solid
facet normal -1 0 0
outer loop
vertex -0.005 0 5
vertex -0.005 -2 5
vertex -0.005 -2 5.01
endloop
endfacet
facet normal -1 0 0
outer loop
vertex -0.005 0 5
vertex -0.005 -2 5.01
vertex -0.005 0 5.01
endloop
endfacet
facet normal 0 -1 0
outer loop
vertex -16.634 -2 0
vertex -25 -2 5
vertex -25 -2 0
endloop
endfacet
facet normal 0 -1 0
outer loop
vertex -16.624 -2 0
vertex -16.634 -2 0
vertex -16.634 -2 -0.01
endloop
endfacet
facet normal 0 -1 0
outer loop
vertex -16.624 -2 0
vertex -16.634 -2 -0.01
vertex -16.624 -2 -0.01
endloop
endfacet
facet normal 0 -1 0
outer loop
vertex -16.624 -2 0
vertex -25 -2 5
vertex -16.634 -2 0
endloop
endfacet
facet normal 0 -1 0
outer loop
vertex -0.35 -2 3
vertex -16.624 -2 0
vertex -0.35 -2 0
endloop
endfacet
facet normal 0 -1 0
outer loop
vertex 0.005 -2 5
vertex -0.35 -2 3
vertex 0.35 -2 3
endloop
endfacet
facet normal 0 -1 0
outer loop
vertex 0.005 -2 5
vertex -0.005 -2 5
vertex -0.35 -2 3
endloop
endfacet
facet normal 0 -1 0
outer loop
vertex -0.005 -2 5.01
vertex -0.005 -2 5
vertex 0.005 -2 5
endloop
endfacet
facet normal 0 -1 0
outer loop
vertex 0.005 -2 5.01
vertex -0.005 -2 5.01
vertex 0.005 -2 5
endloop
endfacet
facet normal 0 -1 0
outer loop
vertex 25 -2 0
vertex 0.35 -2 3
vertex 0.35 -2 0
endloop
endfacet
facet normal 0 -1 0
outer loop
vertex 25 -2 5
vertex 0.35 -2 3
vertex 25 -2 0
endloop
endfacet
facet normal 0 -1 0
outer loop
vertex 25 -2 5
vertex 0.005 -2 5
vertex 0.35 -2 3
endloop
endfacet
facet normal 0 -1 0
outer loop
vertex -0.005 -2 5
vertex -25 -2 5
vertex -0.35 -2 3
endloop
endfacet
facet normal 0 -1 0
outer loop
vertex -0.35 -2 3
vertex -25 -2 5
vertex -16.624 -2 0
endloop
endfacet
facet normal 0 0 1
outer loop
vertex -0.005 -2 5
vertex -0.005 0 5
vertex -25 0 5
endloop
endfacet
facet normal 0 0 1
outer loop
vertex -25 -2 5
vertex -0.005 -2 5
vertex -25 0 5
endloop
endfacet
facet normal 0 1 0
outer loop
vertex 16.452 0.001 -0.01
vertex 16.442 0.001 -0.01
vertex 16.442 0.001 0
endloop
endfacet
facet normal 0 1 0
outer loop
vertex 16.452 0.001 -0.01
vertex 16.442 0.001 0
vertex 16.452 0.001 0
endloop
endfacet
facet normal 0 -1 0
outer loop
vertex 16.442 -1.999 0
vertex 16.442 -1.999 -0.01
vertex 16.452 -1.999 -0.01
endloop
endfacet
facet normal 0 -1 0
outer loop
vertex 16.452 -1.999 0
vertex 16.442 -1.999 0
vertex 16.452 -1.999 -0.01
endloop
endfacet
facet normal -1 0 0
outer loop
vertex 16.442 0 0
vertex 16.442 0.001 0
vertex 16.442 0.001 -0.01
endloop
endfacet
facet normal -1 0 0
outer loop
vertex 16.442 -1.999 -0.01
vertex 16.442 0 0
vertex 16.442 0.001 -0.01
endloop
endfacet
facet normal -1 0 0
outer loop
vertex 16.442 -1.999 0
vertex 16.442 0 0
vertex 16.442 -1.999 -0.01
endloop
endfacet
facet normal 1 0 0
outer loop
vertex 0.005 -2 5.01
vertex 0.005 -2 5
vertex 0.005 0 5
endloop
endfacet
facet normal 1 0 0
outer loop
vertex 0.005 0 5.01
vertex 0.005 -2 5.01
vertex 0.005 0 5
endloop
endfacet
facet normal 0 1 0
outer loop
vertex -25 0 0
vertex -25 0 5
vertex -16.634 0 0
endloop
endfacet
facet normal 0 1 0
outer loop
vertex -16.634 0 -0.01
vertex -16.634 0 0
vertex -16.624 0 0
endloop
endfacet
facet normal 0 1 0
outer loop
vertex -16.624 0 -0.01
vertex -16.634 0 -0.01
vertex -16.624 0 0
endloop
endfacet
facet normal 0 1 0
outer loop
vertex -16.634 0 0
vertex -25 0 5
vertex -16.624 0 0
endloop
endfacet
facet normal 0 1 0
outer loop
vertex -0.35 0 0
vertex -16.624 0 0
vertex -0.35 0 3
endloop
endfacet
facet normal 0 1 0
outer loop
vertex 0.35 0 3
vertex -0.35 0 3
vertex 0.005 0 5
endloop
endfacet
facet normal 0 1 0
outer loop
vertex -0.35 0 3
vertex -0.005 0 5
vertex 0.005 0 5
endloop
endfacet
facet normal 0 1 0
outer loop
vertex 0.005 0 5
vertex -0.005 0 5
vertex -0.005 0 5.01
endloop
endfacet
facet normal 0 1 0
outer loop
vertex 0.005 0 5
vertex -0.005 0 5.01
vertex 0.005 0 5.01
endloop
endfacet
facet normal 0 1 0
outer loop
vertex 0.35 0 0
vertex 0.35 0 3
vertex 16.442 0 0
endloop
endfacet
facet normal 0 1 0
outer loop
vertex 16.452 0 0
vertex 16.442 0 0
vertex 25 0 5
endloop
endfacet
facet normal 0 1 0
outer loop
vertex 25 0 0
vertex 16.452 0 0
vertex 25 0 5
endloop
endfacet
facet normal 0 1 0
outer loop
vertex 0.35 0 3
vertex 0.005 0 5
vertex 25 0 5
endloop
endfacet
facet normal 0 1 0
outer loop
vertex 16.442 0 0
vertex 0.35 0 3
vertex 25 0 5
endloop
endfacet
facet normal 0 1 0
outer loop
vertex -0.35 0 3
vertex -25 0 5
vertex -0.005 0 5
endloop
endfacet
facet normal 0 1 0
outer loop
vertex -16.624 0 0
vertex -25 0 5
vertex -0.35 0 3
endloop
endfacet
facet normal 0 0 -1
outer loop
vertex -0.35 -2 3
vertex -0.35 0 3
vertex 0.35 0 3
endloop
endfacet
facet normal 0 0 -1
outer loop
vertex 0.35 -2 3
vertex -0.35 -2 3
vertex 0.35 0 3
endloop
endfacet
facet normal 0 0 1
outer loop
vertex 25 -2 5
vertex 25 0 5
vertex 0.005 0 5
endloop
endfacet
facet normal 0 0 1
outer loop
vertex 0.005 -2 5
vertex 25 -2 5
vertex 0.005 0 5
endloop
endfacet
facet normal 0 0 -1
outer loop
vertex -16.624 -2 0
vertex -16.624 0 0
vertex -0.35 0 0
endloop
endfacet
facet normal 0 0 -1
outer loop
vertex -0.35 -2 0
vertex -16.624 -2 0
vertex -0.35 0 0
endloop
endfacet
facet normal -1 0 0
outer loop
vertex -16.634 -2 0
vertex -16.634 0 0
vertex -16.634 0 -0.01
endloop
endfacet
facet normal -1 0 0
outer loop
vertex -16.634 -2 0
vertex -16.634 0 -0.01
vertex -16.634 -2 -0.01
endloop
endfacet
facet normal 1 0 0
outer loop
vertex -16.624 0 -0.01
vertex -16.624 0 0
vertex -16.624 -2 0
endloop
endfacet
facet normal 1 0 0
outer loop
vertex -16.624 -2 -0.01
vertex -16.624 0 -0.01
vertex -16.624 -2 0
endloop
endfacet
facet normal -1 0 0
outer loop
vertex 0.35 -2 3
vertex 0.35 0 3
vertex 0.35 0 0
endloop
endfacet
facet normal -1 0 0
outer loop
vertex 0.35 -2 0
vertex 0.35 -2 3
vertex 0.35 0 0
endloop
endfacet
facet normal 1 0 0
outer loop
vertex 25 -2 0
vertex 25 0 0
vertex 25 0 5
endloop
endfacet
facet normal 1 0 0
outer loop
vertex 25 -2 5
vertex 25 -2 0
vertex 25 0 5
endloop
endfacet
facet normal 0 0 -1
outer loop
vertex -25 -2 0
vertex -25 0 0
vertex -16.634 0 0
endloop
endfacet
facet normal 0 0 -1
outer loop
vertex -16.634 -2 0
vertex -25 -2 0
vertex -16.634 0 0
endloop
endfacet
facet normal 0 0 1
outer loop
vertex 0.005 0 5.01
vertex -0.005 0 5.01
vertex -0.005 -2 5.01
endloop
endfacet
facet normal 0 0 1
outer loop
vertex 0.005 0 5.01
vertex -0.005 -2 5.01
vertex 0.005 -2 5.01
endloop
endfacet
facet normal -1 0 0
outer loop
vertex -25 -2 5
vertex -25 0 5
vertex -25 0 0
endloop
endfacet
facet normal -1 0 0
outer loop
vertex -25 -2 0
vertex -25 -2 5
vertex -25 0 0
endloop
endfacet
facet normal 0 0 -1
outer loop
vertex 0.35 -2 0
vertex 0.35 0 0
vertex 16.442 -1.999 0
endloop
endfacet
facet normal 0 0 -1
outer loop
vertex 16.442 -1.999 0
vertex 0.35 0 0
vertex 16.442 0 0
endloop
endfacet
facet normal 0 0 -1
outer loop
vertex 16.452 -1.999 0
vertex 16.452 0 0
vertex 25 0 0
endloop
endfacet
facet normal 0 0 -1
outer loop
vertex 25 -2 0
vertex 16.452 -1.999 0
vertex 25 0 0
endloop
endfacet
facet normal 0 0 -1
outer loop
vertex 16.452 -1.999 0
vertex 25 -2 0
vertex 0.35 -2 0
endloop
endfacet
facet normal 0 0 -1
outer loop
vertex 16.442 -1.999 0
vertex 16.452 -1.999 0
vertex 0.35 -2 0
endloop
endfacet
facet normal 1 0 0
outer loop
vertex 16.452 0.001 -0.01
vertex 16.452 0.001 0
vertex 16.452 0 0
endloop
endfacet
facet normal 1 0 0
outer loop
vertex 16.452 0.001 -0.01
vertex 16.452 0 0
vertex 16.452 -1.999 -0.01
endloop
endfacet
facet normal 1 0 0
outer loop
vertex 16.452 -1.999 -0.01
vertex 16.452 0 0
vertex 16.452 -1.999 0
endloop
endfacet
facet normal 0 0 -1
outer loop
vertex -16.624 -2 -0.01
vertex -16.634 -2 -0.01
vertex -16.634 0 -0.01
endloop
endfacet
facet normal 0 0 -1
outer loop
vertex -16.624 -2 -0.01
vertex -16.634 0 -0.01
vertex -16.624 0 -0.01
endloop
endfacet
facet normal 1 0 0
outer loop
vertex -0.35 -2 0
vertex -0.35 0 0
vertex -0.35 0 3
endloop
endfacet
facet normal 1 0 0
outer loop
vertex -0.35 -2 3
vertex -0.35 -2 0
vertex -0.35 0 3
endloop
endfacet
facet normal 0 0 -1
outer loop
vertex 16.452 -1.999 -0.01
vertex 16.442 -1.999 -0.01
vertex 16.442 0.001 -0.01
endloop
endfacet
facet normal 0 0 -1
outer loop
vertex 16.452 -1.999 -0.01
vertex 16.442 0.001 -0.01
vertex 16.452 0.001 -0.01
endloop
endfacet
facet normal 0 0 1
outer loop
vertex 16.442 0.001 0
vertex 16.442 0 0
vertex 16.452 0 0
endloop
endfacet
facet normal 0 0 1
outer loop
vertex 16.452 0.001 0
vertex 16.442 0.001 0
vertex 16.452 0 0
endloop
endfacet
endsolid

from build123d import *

# Parameters (mm, degrees)
F1_DEPTH = 2
F2_W     = 0.01
F2_H     = 2
F3_DEPTH = 0.01
F4_W     = 0.01
F4_H     = 2
F5_DEPTH = 0.01


with BuildPart() as f1:
    # F0 (on Front) → F1 (new body)
    with BuildSketch(Plane.XZ):
        Polygon((0.35, 3), (0.35, 0), (25, 0), (25, 5), (0, 5), (-25, 5), (-25, 0), (-0.35, 0), (-0.35, 3), (0, 3), align=None)
    extrude(amount=F1_DEPTH)

    # F2 (on face) → F3 (join)
    with BuildSketch(Plane(origin=(0, 0, 0), x_dir=(1, 0, 0), z_dir=(0, 0, -1))):
        with Locations((16.446504, 0.998741)):
            Rectangle(F2_W, F2_H)
        with Locations((-16.628518, 1)):
            Rectangle(F2_W, F2_H)
    extrude(amount=F3_DEPTH)

    # F4 (on face) → F5 (join)
    with BuildSketch(Plane.XY.offset(5)):
        with Locations((0, -1)):
            Rectangle(F4_W, F4_H)
    extrude(amount=F5_DEPTH)


solid = f1.part
